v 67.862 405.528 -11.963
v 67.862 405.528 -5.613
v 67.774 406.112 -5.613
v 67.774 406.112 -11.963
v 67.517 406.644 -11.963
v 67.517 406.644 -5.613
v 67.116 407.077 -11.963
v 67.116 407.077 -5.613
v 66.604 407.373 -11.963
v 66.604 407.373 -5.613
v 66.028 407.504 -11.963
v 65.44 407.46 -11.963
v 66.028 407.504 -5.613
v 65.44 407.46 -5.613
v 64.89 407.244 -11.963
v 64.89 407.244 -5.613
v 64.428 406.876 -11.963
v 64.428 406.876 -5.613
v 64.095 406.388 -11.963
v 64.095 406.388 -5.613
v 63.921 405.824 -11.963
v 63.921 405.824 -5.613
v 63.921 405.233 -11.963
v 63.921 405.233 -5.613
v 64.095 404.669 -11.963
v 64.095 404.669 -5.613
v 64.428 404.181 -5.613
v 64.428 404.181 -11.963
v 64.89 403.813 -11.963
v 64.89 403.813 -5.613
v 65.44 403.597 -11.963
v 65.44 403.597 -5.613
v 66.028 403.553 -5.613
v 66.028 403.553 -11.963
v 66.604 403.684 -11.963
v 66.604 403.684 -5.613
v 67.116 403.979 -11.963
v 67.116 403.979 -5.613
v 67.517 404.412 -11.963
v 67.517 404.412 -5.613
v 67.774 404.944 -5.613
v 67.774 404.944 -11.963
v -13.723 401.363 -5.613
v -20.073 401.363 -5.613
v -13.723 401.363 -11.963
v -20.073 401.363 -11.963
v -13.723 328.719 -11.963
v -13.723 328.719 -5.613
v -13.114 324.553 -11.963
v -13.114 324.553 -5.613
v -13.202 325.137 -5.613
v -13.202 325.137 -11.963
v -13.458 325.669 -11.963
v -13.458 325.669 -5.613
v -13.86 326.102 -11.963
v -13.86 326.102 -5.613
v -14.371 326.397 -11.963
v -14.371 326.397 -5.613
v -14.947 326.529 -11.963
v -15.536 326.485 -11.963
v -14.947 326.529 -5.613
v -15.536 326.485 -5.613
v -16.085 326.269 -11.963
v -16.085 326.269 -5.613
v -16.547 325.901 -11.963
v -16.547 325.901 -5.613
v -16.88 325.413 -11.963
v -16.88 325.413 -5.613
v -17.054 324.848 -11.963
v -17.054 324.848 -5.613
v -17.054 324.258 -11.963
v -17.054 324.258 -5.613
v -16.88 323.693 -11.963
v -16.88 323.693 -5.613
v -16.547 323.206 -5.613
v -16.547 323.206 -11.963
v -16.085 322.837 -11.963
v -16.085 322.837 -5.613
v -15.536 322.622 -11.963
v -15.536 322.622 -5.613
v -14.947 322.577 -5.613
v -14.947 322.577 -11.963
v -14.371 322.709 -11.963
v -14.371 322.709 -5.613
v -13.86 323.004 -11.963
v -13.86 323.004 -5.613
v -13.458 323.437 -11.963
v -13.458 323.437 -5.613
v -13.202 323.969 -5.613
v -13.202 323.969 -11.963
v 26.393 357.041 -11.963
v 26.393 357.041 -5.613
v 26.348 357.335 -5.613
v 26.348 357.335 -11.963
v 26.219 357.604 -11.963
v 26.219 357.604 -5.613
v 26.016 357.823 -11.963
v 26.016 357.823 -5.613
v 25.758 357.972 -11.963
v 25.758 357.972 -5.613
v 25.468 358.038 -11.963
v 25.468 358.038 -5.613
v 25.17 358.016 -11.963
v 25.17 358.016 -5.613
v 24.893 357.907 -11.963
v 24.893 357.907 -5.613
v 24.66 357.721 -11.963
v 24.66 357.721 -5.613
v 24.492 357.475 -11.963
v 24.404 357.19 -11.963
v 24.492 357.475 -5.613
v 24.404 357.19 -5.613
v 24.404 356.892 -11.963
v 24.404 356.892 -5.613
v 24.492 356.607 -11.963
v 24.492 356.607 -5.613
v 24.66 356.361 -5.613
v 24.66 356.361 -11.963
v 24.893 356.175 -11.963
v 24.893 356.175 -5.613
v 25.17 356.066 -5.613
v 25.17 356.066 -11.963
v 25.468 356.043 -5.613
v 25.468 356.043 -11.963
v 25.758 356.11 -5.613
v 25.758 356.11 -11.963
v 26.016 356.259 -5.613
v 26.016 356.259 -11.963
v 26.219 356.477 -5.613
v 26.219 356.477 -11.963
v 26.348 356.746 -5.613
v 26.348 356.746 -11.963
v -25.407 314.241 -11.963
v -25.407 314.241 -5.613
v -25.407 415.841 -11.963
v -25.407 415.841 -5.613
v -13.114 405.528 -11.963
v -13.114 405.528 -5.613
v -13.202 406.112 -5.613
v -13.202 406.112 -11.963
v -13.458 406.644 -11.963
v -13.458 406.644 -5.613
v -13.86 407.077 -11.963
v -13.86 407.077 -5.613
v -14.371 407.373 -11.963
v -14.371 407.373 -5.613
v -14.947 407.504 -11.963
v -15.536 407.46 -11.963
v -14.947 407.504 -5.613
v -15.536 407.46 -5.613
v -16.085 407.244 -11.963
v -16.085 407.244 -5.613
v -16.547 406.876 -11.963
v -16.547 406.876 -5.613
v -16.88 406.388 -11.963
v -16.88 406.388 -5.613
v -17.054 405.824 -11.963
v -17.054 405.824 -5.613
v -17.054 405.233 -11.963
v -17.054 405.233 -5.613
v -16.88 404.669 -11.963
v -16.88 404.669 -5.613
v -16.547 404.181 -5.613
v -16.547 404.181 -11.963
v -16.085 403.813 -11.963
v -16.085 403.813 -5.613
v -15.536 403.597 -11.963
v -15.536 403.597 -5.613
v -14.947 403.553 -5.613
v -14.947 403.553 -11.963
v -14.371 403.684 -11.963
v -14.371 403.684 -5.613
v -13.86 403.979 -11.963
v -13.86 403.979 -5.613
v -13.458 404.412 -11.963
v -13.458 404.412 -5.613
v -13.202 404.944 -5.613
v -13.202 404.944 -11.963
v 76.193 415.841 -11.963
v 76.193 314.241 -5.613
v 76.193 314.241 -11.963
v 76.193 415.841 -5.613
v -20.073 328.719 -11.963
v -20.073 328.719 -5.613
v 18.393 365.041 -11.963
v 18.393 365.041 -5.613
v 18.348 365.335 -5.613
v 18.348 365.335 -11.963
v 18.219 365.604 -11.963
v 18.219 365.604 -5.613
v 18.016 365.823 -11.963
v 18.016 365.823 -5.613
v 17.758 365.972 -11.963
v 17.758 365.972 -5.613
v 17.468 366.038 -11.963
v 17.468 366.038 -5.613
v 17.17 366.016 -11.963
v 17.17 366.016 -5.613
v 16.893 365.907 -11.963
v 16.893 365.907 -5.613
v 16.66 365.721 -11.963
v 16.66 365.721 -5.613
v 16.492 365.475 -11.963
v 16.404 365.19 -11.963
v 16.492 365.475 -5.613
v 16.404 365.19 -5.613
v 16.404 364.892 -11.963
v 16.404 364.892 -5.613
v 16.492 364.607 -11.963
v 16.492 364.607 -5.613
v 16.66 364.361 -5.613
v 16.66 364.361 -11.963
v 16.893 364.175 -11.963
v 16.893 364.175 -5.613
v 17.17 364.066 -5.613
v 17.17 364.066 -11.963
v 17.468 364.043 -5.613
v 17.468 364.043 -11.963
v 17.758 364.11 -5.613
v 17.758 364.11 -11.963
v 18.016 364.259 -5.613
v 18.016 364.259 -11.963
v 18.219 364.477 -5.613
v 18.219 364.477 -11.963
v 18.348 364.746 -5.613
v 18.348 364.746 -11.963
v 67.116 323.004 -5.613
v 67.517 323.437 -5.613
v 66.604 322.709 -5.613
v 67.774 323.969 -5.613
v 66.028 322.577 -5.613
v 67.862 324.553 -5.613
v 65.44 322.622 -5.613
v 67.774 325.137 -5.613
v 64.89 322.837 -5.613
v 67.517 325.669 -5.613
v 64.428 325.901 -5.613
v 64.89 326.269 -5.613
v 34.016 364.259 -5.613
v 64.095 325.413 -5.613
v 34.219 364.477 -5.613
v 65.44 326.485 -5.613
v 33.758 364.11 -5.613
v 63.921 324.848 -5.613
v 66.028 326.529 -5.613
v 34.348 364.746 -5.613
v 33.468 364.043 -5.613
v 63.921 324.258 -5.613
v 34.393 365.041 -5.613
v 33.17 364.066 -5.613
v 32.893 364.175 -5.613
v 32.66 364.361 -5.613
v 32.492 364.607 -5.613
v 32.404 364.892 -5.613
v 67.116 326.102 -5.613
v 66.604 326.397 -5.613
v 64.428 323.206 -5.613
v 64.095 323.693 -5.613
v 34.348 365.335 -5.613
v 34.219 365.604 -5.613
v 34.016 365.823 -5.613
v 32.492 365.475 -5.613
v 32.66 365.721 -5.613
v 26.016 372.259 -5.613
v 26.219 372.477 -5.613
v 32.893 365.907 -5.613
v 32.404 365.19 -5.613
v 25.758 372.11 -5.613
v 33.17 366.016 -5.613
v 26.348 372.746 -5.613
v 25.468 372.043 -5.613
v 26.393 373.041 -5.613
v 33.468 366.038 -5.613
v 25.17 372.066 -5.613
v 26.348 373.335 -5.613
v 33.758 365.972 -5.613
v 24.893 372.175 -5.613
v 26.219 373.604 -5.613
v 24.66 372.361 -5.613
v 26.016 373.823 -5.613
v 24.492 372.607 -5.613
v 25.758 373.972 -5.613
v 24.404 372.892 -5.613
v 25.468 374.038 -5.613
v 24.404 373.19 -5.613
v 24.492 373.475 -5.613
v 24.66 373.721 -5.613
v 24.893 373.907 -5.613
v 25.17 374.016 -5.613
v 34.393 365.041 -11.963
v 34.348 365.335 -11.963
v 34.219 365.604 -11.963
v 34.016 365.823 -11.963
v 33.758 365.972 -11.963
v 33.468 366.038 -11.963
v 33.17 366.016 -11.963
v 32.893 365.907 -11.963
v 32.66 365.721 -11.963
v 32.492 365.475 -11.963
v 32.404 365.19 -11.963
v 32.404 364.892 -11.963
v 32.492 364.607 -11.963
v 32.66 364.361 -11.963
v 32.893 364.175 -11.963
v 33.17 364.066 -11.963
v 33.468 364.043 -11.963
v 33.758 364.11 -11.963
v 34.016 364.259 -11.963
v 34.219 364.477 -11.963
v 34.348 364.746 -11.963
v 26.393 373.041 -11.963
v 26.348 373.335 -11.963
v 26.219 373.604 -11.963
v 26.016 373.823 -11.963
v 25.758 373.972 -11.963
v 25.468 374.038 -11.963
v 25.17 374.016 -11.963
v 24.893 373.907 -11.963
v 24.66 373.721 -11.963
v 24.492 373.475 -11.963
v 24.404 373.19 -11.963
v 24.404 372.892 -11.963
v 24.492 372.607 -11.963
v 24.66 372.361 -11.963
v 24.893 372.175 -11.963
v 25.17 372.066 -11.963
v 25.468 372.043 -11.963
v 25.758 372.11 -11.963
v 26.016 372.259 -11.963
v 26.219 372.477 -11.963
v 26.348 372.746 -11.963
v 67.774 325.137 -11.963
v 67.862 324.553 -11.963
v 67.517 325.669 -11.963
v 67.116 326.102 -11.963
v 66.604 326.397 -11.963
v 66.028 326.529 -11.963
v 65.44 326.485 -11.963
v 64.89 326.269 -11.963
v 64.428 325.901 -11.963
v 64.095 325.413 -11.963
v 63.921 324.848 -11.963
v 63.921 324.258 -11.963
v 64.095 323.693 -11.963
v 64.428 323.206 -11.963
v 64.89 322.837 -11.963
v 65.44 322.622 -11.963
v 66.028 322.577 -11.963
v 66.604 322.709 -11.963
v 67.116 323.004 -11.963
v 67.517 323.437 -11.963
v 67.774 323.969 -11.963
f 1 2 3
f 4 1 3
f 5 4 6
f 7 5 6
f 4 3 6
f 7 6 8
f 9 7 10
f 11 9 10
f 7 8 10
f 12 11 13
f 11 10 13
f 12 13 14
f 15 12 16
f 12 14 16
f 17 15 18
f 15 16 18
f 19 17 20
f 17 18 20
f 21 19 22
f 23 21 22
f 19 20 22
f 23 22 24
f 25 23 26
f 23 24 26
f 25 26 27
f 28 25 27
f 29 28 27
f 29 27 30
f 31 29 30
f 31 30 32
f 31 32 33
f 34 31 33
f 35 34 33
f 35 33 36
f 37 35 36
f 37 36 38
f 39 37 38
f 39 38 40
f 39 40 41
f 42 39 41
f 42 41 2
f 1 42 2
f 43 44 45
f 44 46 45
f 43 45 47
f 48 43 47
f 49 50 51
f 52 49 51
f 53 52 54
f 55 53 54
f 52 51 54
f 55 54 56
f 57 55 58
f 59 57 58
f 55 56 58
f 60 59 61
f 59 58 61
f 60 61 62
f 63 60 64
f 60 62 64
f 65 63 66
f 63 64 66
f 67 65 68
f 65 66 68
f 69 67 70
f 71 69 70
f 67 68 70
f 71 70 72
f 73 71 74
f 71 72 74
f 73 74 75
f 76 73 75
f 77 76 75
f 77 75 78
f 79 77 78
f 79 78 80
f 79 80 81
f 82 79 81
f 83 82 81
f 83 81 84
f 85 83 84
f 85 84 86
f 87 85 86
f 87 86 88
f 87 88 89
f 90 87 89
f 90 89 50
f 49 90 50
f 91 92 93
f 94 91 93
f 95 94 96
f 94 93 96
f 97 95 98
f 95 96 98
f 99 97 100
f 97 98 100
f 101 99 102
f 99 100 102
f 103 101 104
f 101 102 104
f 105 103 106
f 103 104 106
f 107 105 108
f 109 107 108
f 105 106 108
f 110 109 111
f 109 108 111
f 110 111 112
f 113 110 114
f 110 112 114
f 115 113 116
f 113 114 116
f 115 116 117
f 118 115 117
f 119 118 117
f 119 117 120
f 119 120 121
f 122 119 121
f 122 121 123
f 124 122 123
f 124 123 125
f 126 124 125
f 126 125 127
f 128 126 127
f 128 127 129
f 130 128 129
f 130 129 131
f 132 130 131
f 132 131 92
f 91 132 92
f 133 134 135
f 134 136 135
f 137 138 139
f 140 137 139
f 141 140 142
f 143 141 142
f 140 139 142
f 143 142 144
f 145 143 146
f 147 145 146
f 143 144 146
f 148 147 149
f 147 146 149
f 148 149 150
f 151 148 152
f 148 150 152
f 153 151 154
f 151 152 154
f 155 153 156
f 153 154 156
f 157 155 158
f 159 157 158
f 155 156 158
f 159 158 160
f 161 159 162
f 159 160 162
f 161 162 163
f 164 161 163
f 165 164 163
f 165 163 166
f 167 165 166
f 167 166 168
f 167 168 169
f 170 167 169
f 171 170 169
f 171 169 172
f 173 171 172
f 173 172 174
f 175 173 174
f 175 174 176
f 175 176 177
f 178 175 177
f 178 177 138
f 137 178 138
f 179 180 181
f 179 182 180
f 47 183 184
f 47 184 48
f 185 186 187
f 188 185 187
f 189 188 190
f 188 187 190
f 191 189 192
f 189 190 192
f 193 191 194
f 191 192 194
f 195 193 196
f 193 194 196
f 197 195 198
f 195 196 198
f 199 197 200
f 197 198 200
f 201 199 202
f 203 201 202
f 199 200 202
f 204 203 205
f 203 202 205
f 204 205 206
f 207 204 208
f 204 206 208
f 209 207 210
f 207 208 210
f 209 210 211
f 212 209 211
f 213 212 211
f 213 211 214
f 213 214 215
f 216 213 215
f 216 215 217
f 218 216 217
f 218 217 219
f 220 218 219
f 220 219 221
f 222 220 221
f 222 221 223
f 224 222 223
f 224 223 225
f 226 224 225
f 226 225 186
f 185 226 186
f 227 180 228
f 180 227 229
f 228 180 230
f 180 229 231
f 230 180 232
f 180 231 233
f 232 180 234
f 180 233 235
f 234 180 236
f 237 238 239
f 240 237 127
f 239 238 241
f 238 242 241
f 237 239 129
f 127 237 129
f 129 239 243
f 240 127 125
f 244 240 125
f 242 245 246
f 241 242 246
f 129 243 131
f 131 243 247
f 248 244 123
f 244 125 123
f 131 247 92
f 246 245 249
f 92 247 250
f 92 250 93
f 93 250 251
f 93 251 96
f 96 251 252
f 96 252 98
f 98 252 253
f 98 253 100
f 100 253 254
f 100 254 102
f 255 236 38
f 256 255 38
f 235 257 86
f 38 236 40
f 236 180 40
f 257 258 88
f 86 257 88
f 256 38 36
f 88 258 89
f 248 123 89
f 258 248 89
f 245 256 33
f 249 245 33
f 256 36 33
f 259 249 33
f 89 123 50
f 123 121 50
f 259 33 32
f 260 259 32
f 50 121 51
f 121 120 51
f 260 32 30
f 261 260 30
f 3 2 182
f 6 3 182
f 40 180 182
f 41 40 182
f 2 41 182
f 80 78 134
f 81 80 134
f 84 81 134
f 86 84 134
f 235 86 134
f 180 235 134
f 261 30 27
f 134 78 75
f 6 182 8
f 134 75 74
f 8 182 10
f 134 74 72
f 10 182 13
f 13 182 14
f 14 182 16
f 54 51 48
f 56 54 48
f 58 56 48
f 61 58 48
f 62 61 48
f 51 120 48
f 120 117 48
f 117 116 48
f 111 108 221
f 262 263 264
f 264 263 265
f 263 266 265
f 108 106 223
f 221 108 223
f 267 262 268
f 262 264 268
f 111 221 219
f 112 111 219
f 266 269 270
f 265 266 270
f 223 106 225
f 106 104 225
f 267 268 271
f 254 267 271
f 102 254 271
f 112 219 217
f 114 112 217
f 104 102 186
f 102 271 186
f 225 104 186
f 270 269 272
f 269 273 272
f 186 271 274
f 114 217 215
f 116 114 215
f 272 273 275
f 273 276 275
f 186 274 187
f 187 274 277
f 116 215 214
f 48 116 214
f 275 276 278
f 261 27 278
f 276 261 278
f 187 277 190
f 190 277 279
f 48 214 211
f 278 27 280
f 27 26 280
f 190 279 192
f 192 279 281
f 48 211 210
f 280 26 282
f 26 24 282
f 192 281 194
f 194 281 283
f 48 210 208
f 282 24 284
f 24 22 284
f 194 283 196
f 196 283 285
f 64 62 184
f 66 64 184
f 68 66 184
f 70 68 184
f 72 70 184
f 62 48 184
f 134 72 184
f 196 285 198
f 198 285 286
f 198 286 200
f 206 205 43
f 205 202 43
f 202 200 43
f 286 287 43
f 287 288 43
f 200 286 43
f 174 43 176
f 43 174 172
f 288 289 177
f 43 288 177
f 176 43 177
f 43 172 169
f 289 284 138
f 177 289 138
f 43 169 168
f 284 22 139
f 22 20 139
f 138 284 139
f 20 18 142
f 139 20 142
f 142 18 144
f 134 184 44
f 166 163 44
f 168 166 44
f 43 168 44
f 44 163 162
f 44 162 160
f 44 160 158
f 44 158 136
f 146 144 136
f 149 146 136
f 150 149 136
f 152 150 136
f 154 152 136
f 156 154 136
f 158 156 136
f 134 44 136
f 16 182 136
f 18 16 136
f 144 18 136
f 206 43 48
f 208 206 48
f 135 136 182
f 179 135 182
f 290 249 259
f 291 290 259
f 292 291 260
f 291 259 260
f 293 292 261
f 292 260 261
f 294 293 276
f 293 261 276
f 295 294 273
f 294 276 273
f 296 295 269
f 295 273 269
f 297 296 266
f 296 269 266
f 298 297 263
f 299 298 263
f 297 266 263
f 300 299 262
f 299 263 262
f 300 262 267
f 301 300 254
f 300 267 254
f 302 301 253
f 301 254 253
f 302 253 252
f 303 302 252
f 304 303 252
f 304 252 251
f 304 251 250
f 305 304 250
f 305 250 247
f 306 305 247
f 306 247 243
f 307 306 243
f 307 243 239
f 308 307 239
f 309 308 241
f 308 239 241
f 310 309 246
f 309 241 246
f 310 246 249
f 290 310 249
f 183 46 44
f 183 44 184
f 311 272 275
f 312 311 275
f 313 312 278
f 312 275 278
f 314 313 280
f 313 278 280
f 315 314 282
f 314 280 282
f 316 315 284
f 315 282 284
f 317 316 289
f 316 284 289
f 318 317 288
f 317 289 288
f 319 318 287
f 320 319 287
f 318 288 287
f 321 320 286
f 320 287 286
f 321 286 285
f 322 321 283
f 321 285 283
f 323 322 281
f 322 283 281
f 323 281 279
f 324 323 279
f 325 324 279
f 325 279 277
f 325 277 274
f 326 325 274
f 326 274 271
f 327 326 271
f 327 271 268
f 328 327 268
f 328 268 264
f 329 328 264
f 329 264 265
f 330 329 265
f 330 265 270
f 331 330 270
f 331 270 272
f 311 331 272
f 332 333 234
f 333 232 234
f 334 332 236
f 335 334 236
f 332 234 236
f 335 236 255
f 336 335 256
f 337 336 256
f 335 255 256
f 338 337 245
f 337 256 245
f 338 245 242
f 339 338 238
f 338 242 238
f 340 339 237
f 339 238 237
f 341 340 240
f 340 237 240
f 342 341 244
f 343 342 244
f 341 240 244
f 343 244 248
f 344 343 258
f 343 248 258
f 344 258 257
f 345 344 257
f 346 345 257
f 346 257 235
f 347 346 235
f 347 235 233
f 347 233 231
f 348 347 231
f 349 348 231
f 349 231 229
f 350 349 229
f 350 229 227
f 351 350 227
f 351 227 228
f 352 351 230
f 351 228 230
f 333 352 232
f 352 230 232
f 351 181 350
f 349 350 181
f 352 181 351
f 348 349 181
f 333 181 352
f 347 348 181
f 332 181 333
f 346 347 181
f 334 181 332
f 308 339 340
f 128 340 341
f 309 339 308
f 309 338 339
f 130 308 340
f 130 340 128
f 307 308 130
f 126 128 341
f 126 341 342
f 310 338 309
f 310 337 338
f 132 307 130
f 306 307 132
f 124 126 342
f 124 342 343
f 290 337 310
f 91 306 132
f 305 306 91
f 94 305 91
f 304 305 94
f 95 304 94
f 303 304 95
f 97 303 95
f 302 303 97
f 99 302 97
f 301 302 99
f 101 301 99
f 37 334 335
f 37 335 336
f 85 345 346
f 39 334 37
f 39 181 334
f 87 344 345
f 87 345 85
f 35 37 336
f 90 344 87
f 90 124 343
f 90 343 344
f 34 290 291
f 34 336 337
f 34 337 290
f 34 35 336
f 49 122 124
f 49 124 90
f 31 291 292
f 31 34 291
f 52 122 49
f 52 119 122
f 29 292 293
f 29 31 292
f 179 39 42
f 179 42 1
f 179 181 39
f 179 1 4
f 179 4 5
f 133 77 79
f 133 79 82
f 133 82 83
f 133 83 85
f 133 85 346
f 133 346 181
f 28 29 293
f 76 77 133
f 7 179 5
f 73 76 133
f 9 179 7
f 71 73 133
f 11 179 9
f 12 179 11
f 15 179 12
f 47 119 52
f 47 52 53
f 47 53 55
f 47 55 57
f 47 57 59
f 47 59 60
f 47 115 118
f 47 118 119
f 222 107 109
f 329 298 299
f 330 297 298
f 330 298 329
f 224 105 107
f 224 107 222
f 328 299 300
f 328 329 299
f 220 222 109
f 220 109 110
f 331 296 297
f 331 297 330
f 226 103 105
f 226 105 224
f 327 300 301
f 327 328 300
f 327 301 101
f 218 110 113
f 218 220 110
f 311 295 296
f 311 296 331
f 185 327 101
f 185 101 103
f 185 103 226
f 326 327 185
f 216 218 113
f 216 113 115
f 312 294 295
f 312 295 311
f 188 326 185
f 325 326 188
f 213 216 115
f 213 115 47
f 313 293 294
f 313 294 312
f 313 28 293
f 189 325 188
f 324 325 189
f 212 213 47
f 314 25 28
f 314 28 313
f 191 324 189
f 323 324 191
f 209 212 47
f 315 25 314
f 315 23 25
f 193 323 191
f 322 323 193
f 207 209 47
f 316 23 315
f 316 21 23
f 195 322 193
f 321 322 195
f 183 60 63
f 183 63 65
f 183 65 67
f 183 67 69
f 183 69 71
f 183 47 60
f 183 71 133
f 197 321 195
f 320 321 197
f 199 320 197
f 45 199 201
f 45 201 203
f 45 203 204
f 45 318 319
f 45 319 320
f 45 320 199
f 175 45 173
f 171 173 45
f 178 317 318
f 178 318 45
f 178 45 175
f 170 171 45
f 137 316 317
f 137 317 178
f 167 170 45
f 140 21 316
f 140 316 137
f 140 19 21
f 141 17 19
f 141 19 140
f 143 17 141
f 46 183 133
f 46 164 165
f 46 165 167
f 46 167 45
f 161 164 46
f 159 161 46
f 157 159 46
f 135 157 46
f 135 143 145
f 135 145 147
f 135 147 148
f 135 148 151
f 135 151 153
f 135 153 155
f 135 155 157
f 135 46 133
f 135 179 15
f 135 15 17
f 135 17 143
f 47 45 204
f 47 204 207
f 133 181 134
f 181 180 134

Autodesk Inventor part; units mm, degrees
ref_plane "YZ Plane" through (0, 0, 0) normal (1, 0, 0) x (0, 1, 0)
ref_plane "XZ Plane" through (0, 0, 0) normal (0, 1, 0) x (-1, 0, 0)
ref_plane "XY Plane" through (0, 0, 0) normal (0, 0, 1) x (1, 0, 0)
sketch "Sketch1" plane through (0, 0, 0) normal (0, 0, 1) x (1, 0, 0)
  line L0 (-25.4072, 25.3665) -> (76.1928, 25.3665)
  line L1 (76.1928, 25.3665) -> (76.1928, -76.2335)
  line L2 (76.1928, -76.2335) -> (-25.4072, -76.2335)
  line L3 (-25.4072, -76.2335) -> (-25.4072, 25.3665)
  point P0 (0, 0)
  dimension "d0" = 101.6
  dimension "d1" = 101.6
extrude "Extrusion1" add sketch "Sketch1" along normal blind 0.7366
sketch "Sketch2" plane through (0, 0, 0.7366) normal (0, 0, 1) x (1, 0, 0)
  line L0 (-25.4072, 25.3665) -> (76.1928, -76.2335)
  line L1 (76.1928, 25.3665) -> (-25.4072, -76.2335)
  circle A0 centre (25.3928, -25.4335) radius 27.432
  point P0 (0, 0)
  dimension "d4" = 54.864
extrude "Extrusion2" cut sketch "Sketch2" against normal blind 0.7366
sketch "Sketch3" plane through (0, 0, 0.7366) normal (0, 0, 1) x (1, 0, 0)
  line L0 (-25.4072, -76.2335) -> (-25.4072, 25.3665) projected
  line L1 (-25.4072, 25.3665) -> (-25.4072, -25.4335)
  line L2 (-25.4072, -25.4335) -> (-25.4072, 19.4102)
  line L3 (-25.4072, 25.3665) -> (76.1928, -76.2335)
  line L4 (76.1928, 25.3665) -> (-25.4072, -76.2335)
  circle A0 centre (-19.4509, 19.4102) radius 1.9812
  point P0 (0, 0)
  dimension "d7" = 44.8437
  dimension "d8" = 3.9624
extrude "Extrusion3" cut sketch "Sketch3" against normal blind 0.7366 contours A0 L3 | L3 A0
sketch "Sketch4" plane through (0, 0, 0.7366) normal (0, 0, 1) x (1, 0, 0)
  line L0 (-25.4072, -76.2335) -> (76.1928, 25.3665)
  line L1 (-25.4072, 25.3665) -> (76.1928, -76.2335)
  circle A0 centre (70.2365, 19.4102) radius 1.9819
  circle A1 centre (70.2365, -70.2772) radius 1.983
  circle A2 centre (-19.4509, -70.2772) radius 1.9812
  point P0 (0, 0)
extrude "Extrusion4" cut sketch "Sketch4" against normal blind 0.7366
sketch "Sketch5" plane through (0, 0, 0.7366) normal (0, 0, 1) x (1, 0, 0)
  circle A0 centre (25.3928, -25.4335) radius 27.432 projected
  circle A1 centre (25.3928, -25.4335) radius 29.972
  circle A2 centre (25.3928, -25.4335) radius 32.512
  point P0 (0, 0)
  dimension "d13" = 59.944
  dimension "d14" = 65.024
extrude "Extrusion5" add sketch "Sketch5" along normal blind 6.6548 contours A2
fillet "Fillet1" radius 3.175 4 edges at (-25.4072, 25.3665, 0.3683) (76.1928, 25.3665, 0.3683) (76.1928, -76.2335, 0.3683) (-25.4072, -76.2335, 0.3683)
sketch "Sketch6" plane through (25.3928, -25.4335, 0.7366) normal (0, 0, 1) x (1, 0, 0)
  circle A0 centre (0, 0) radius 29.972 projected
  circle A1 centre (0, 0) radius 27.432 projected
  point P0 (-25.3928, 25.4335)
extrude "Extrusion6" add sketch "Sketch6" along normal blind 9.1948
sketch "Sketch7" plane through (25.3928, -25.4335, 7.3914) normal (0, 0, 1) x (1, 0, 0)
  circle A0 centre (0, 0) radius 29.972 projected
  circle A1 centre (0, 0) radius 32.512 projected
  point P0 (-25.3928, 25.4335)
extrude "Extrusion7" cut sketch "Sketch7" against normal blind 6.6548
sketch "Sketch8" plane through (25.3928, -25.4335, 9.9314) normal (0, 0, 1) x (1, 0, 0)
  circle A0 centre (0, 0) radius 27.432 projected
  circle A1 centre (0, 0) radius 29.972 projected
  point P0 (-25.3928, 25.4335)
extrude "Extrusion8" cut sketch "Sketch8" against normal blind 2.54
sketch "Sketch9" plane through (0, 0, 0.7366) normal (0, 0, 1) x (1, 0, 0)
  circle A0 centre (-19.4509, 19.4102) radius 1.9812 projected
  circle A1 centre (70.2365, -70.2772) radius 1.983 projected
  circle A2 centre (-19.4509, -70.2772) radius 1.9812 projected
  circle A3 centre (70.2365, 19.4102) radius 1.9819 projected
  point P0 (0, 0)
extrude "Extrusion9" add sketch "Sketch9" against normal blind 0.7366
sketch "Sketch10" plane through (0, 0, 0.7366) normal (0, 0, 1) x (1, 0, 0)
  line L0 (-25.4072, 25.3665) -> (76.1928, 25.3665)
  line L1 (76.1928, 25.3665) -> (76.1928, -76.2335)
  line L2 (76.1928, -76.2335) -> (-25.4072, -76.2335)
  line L3 (-25.4072, -76.2335) -> (-25.4072, 25.3665)
  line L4 (-25.4072, 25.3665) -> (76.1928, -76.2335)
  line L5 (-25.4072, -76.2335) -> (76.1928, 25.3665)
  line L6 (-25.4072, 25.3665) -> (-25.4072, -25.4335)
  line L7 (-25.4072, -25.4335) -> (-25.4072, 15.0541)
  circle A0 centre (-15.0948, 15.0541) radius 1.9812
  circle A1 centre (65.8804, 15.0541) radius 1.9818
  circle A2 centre (65.8804, -65.9211) radius 1.9832
  circle A3 centre (-15.0948, -65.9211) radius 1.9812
  point P0 (0, 0)
  dimension "d26" = 40.4876
  dimension "d27" = 3.9624
extrude "Extrusion10" cut sketch "Sketch10" against normal blind 0.7366 contours A0 L4 | L4 A0 | A1 L5 | L5 A1 | A2 L4 | L4 A2 | A3 L5 | L5 A3
sketch "Sketch11" plane through (0, 0, 0.7366) normal (0, 0, 1) x (1, 0, 0)
  circle A0 centre (-15.0948, 15.0541) radius 1.9812 projected
  circle A1 centre (-15.0948, -65.9211) radius 1.9812 projected
  circle A2 centre (65.8804, 15.0541) radius 1.9818 projected
  circle A3 centre (65.8804, -65.9211) radius 1.9832 projected
  line L0 (-25.4072, 25.3665) -> (76.1928, 25.3665)
  line L1 (76.1928, 25.3665) -> (76.1928, -76.2335)
  line L2 (76.1928, -76.2335) -> (-25.4072, -76.2335)
  line L3 (-25.4072, -76.2335) -> (-25.4072, 25.3665)
  point P0 (0, 0)
extrude "Extrusion11" add sketch "Sketch11" along normal blind 12.7
sketch "Sketch12" plane through (0, 0, 13.4366) normal (0, 0, 1) x (1, 0, 0)
  circle A0 centre (65.8804, -65.9211) radius 1.9832 projected
  circle A1 centre (65.8804, 15.0541) radius 1.9818 projected
  circle A2 centre (-15.0948, 15.0541) radius 1.9812 projected
  circle A3 centre (-15.0948, -65.9211) radius 1.9812 projected
  line L0 (76.1928, 25.3665) -> (76.1928, -76.2335) projected
  line L1 (-25.4072, 25.3665) -> (76.1928, 25.3665) projected
  line L2 (-25.4072, -76.2335) -> (-25.4072, 25.3665) projected
  line L3 (76.1928, -76.2335) -> (-25.4072, -76.2335) projected
  point P0 (0, 0)
extrude "Extrusion12" add sketch "Sketch12" against normal blind 19.05
sketch "Sketch13" plane through (0, 0, 13.4366) normal (0, 0, 1) x (1, 0, 0)
  circle A0 centre (65.8804, -65.9211) radius 1.9832 projected
  circle A1 centre (65.8804, 15.0541) radius 1.9818 projected
  circle A2 centre (-15.0948, 15.0541) radius 1.9812 projected
  circle A3 centre (-15.0948, -65.9211) radius 1.9812 projected
  line L0 (76.1928, 25.3665) -> (76.1928, -76.2335) projected
  line L1 (-25.4072, 25.3665) -> (76.1928, 25.3665) projected
  line L2 (-25.4072, -76.2335) -> (-25.4072, 25.3665) projected
  line L3 (76.1928, -76.2335) -> (-25.4072, -76.2335) projected
  point P0 (0, 0)
extrude "Extrusion13" cut sketch "Sketch13" against normal blind 12.7
sketch "Sketch14" plane through (-25.4072, 25.3665, -5.6134) normal (0, 1, 0) x (1, 0, 0)
  line L0 (0, -6.35) -> (101.6, -6.35) projected
  line L1 (101.6, -6.35) -> (101.6, 0) projected
  line L2 (101.6, 0) -> (0, 0) projected
  line L3 (0, 0) -> (0, -6.35) projected
  point P0 (25.4072, -5.6134)
sketch "Sketch15" plane through (-25.4072, -76.2335, -5.6134) normal (-1, 0, 0) x (0, 0, 1)
  line L0 (6.35, 0) -> (6.35, 101.6) projected
  line L1 (0, 101.6) -> (6.35, 101.6) projected
  line L2 (0, 101.6) -> (0, 0) projected
  line L3 (6.35, 0) -> (0, 0) projected
  point P0 (5.6134, 76.2335)
sketch "Sketch16" plane through (-25.4072, -76.2335, -5.6134) normal (0, -1, 0) x (1, 0, 0)
  line L0 (101.6, 6.35) -> (0, 6.35) projected
  line L1 (0, 6.35) -> (0, 0) projected
  line L2 (0, 0) -> (101.6, 0) projected
  line L3 (101.6, 6.35) -> (101.6, 0) projected
  point P0 (25.4072, 5.6134)
sketch "Sketch17" plane through (76.1928, -76.2335, -5.6134) normal (1, 0, 0) x (0, 0, -1)
  line L0 (-6.35, 101.6) -> (-6.35, 0) projected
  line L1 (-6.35, 0) -> (0, 0) projected
  line L2 (0, 0) -> (0, 101.6) projected
  line L3 (-6.35, 101.6) -> (0, 101.6) projected
  point P0 (-5.6134, 76.2335)
extrude "Extrusion14" add sketch "Sketch14" along normal blind 53.975
extrude "Extrusion15" add sketch "Sketch17" along normal blind 47.625
extrude "Extrusion16" add sketch "Sketch16" along normal blind 47.625
extrude "Extrusion17" add sketch "Sketch15" along normal blind 53.975
sketch "Sketch18" plane through (-25.4072, 25.3665, 0.7366) normal (0, 1, 0) x (1, 0, 0)
  line L0 (-53.975, 6.35) -> (-53.975, 0) projected
  line L1 (0, 0) -> (-53.975, 0) projected
  line L2 (0, 6.35) -> (0, 0) projected
  line L3 (0, 6.35) -> (-53.975, 6.35) projected
  point P0 (25.4072, 0.7366)
extrude "Extrusion18" add sketch "Sketch18" along normal blind 53.975
sketch "Sketch19" plane through (76.1928, 25.3665, 0.7366) normal (0, 1, 0) x (1, 0, 0)
  line L0 (47.625, 0) -> (47.625, 6.35) projected
  line L1 (0, 6.35) -> (47.625, 6.35) projected
  line L2 (0, 0) -> (0, 6.35) projected
  line L3 (0, 0) -> (47.625, 0) projected
  point P0 (-76.1928, 0.7366)
extrude "Extrusion19" add sketch "Sketch19" along normal blind 53.975
sketch "Sketch20" plane through (-25.4072, -123.8585, -5.6134) normal (-1, 0, 0) x (0, 0, 1)
  line L0 (6.35, 47.625) -> (0, 47.625) projected
  line L1 (0, 47.625) -> (0, 0) projected
  line L2 (0, 0) -> (6.35, 0) projected
  line L3 (6.35, 0) -> (6.35, 47.625) projected
  point P0 (5.6134, 123.8585)
extrude "Extrusion20" add sketch "Sketch20" along normal blind 53.975
sketch "Sketch21" plane through (123.8178, -76.2335, -5.6134) normal (0, -1, 0) x (1, 0, 0)
  line L0 (-47.625, 6.35) -> (-47.625, 0) projected
  line L1 (-47.625, 0) -> (0, 0) projected
  line L2 (0, 0) -> (0, 6.35) projected
  line L3 (0, 6.35) -> (-47.625, 6.35) projected
  point P0 (-123.8178, 5.6134)
extrude "Extrusion21" add sketch "Sketch21" along normal blind 47.625
sketch "Sketch22" plane through (-25.4072, 79.3415, -5.6134) normal (0, 1, 0) x (1, 0, 0)
  line L0 (149.225, -6.35) -> (-53.975, -6.35) projected
  line L1 (149.225, 0) -> (149.225, -6.35) projected
  line L2 (-53.975, 0) -> (149.225, 0) projected
  line L3 (-53.975, -6.35) -> (-53.975, 0) projected
  point P0 (25.4072, -5.6134)
extrude "Extrusion22" cut sketch "Sketch22" against normal blind 53.975
sketch "Sketch23" plane through (-79.3822, -76.2335, -5.6134) normal (-1, 0, 0) x (0, 0, 1)
  line L0 (6.35, 101.6) -> (0, 101.6) projected
  line L1 (0, -47.625) -> (0, 101.6) projected
  line L2 (6.35, -47.625) -> (0, -47.625) projected
  line L3 (6.35, 101.6) -> (6.35, -47.625) projected
  point P0 (5.6134, 76.2335)
extrude "Extrusion23" cut sketch "Sketch23" against normal blind 53.975
sketch "Sketch24" plane through (-25.4072, -123.8585, -5.6134) normal (0, -1, 0) x (1, 0, 0)
  line L0 (0, 6.35) -> (0, 0) projected
  line L1 (149.225, 0) -> (0, 0) projected
  line L2 (149.225, 6.35) -> (149.225, 0) projected
  line L3 (0, 6.35) -> (149.225, 6.35) projected
  point P0 (25.4072, 5.6134)
extrude "Extrusion24" cut sketch "Sketch24" against normal blind 47.625
sketch "Sketch25" plane through (123.8178, -76.2335, -5.6134) normal (1, 0, 0) x (0, 0, -1)
  line L0 (-6.35, 0) -> (0, 0) projected
  line L1 (0, 101.6) -> (0, 0) projected
  line L2 (0, 101.6) -> (-6.35, 101.6) projected
  line L3 (-6.35, 0) -> (-6.35, 101.6) projected
  point P0 (-5.6134, 76.2335)
extrude "Extrusion25" cut sketch "Sketch25" against normal blind 47.625
sketch "Sketch26" plane through (-25.4072, 25.3665, -5.6134) normal (0, 1, 0) x (1, 0, 0)
  line L0 (101.6, -6.35) -> (101.6, 0) projected
  line L1 (0, 0) -> (101.6, 0) projected
  line L2 (0, 0) -> (0, -6.35) projected
  line L3 (101.6, -6.35) -> (0, -6.35) projected
  point P0 (25.4072, -5.6134)
extrude "Extrusion26" add sketch "Sketch26" along normal blind 53.975
sketch "Sketch27" plane through (-25.4072, -76.2335, -5.6134) normal (-1, 0, 0) x (0, 0, 1)
  line L0 (0, 0) -> (6.35, 0) projected
  line L1 (6.35, 0) -> (6.35, 155.575) projected
  line L2 (6.35, 155.575) -> (0, 155.575) projected
  line L3 (0, 0) -> (0, 155.575) projected
  point P0 (5.6134, 76.2335)
extrude "Extrusion27" add sketch "Sketch27" along normal blind 53.975
sketch "Sketch28" plane through (-25.4072, -76.2335, -5.6134) normal (0, -1, 0) x (1, 0, 0)
  line L0 (101.6, 0) -> (101.6, 6.35) projected
  line L1 (101.6, 6.35) -> (-53.975, 6.35) projected
  line L2 (-53.975, 6.35) -> (-53.975, 0) projected
  line L3 (101.6, 0) -> (-53.975, 0) projected
  point P0 (25.4072, 5.6134)
extrude "Extrusion28" add sketch "Sketch28" along normal blind 22.225
sketch "Sketch29" plane through (-25.4072, 79.3415, -5.6134) normal (0, 1, 0) x (1, 0, 0)
  line L0 (101.6, -6.35) -> (-53.975, -6.35) projected
  line L1 (101.6, 0) -> (101.6, -6.35) projected
  line L2 (-53.975, 0) -> (101.6, 0) projected
  line L3 (-53.975, 0) -> (-53.975, -6.35) projected
  point P0 (25.4072, -5.6134)
extrude "Extrusion29" add sketch "Sketch29" along normal blind 158.6992
sketch "Sketch30" plane through (-25.4072, 238.0407, -5.6134) normal (0, 1, 0) x (1, 0, 0)
  line L0 (-53.975, -6.35) -> (-53.975, 0) projected
  line L1 (101.6, -6.35) -> (-53.975, -6.35) projected
  line L2 (101.6, 0) -> (101.6, -6.35) projected
  line L3 (-53.975, 0) -> (101.6, 0) projected
  point P0 (25.4072, -5.6134)
extrude "Extrusion30" add sketch "Sketch30" along normal blind 177.8
sketch "Sketch31" plane through (0, 0, 0.7366) normal (0, 0, 1) x (1, 0, 0)
  line L0 (76.1928, 415.8407) -> (76.1928, -98.4585) projected
  line L1 (76.1928, 415.8407) -> (-79.3822, 415.8407) projected
  line L2 (65.8804, 415.8407) -> (65.8804, 383.3033)
  line L3 (65.8804, 383.3033) -> (-17.076, 383.3033)
  line L4 (-17.076, 383.3033) -> (-13.1136, 383.3033)
  line L5 (-13.1136, 383.3033) -> (-15.0948, 383.3033)
  circle A0 centre (-15.0948, 383.3033) radius 1.9812
  circle A1 centre (65.8804, 383.3033) radius 1.9812
  line L6 (65.8804, 383.3033) -> (65.8804, 302.3281)
  circle A2 centre (65.8804, 302.3281) radius 1.9812
  line L7 (-15.0948, 383.3033) -> (-15.0948, 302.3281)
  circle A3 centre (-15.0948, 302.3281) radius 1.9812
  point P0 (0, 0)
  dimension "d70" = 32.5374
  dimension "d71" = 80.9752
extrude "Extrusion31" cut sketch "Sketch31" against normal blind 177.8
sketch "Sketch32" plane through (0, 0, -5.6134) normal (0, 0, -1) x (-1, 0, 0)
  circle A0 centre (15.0948, 383.3033) radius 1.9812 projected
  circle A1 centre (15.0948, 302.3281) radius 1.9812 projected
  circle A2 centre (-65.8804, 302.3281) radius 1.9812 projected
  circle A3 centre (-65.8804, 383.3033) radius 1.9812 projected
  circle A4 centre (15.0948, -65.9211) radius 1.9812 projected
  circle A5 centre (15.0948, 15.0541) radius 1.9812 projected
  circle A6 centre (-65.8804, 15.0541) radius 1.9818 projected
  circle A7 centre (-65.8804, -65.9211) radius 1.9832 projected
  line L0 (-76.1928, 415.8407) -> (-76.1928, -98.4585) projected
  line L1 (-76.1928, -98.4585) -> (79.3822, -98.4585) projected
  line L2 (79.3822, -98.4585) -> (79.3822, 415.8407) projected
  line L3 (79.3822, 415.8407) -> (-76.1928, 415.8407) projected
  point P0 (0, 0)
extrude "Extrusion32" add sketch "Sketch32" along normal blind 6.35
sketch "Sketch33" plane through (0, 0, 0.7366) normal (0, 0, 1) x (1, 0, 0)
  line L0 (76.1928, 415.8407) -> (76.1928, -98.4585) projected
  line L1 (76.1928, 158.6911) -> (76.1928, 107.8911)
  line L2 (76.1928, 107.8911) -> (25.3928, 107.8911)
  line L3 (25.3928, 107.8911) -> (25.3928, 209.4911)
  line L4 (25.3928, 209.4911) -> (76.1928, 209.4911)
  line L5 (76.1928, 209.4911) -> (76.1928, 107.8911)
  point P0 (0, 0)
  dimension "d76" = 50.8
  dimension "d77" = 50.8
  dimension "d78" = 101.6
extrude "Extrusion33" cut sketch "Sketch33" against normal blind 25.4
sketch "Sketch34" plane through (0, 0, 0.7366) normal (0, 0, 1) x (1, 0, 0)
  line L0 (25.3928, 107.8911) -> (25.3928, 209.4911) projected
  line L1 (76.1928, 107.8911) -> (76.1928, -98.4585) projected
  line L2 (25.3928, 158.6911) -> (-25.4072, 158.6911)
  circle A0 centre (-25.4072, 158.6911) radius 12.7
  point P0 (0, 0)
  dimension "d81" = 50.8
  dimension "d82" = 25.4
extrude "Extrusion34" cut sketch "Sketch34" against normal blind 25.4
fillet "Fillet2" radius 12.7 2 edges at (25.3928, 209.4911, -5.6134) (25.3928, 107.8911, -5.6134)
sketch "Sketch35" plane through (0, 0, 0.7366) normal (0, 0, 1) x (1, 0, 0)
  line L0 (-79.3822, 415.8407) -> (76.1928, 415.8407)
  line L1 (76.1928, 415.8407) -> (76.1928, 422.1907)
  line L2 (76.1928, 422.1907) -> (-79.3822, 422.1907)
  line L3 (-79.3822, 422.1907) -> (-79.3822, 415.8407)
  line L4 (-79.3822, -98.4585) -> (76.1928, -98.4585)
  line L5 (76.1928, -98.4585) -> (76.1928, -104.8085)
  line L6 (76.1928, -104.8085) -> (-79.3822, -104.8085)
  line L7 (-79.3822, -104.8085) -> (-79.3822, -98.4585)
  point P0 (0, 0)
  dimension "d86" = 6.35
  dimension "d87" = 6.35
extrude "Extrusion35" add sketch "Sketch35" against normal blind 6.35
sketch "Sketch36" plane through (-25.4072, 415.8407, -5.6134) normal (0, 1, 0) x (1, 0, 0)
  line L0 (-53.975, 0) -> (101.6, 0) projected
  line L1 (101.6, 6.35) -> (101.6, 0) projected
  line L2 (101.6, 6.35) -> (-53.975, 6.35) projected
  line L3 (-53.975, 0) -> (-53.975, 6.35) projected
  point P0 (25.4072, -5.6134)
extrude "Extrusion36" add sketch "Sketch36" along normal blind 6.35
sketch "Sketch37" plane through (-25.4072, -98.4585, -5.6134) normal (0, -1, 0) x (1, 0, 0)
  line L0 (101.6, 0) -> (-53.975, 0) projected
  line L1 (-53.975, -6.35) -> (-53.975, 0) projected
  line L2 (-53.975, -6.35) -> (101.6, -6.35) projected
  line L3 (101.6, 0) -> (101.6, -6.35) projected
  point P0 (25.4072, 5.6134)
extrude "Extrusion37" add sketch "Sketch37" along normal blind 6.35
sketch "Sketch38" plane through (0, 0, 0.7366) normal (0, 0, 1) x (1, 0, 0)
  line L0 (76.1928, 422.1907) -> (-79.3822, 422.1907) projected
  line L1 (76.1928, 107.8911) -> (76.1928, -104.8085) projected
  circle A0 centre (65.8804, 302.3281) radius 1.9812 projected
  circle A1 centre (-15.0948, 302.3281) radius 1.9812 projected
  line L2 (-15.0948, 422.1907) -> (-15.0948, 405.5283)
  line L3 (-15.0948, 405.5283) -> (65.8804, 405.5283)
  line L4 (65.8804, 302.3281) -> (65.8804, 324.5531)
  line L5 (-15.0948, 302.3281) -> (-15.0948, 324.5531)
  circle A2 centre (-15.0948, 324.5531) radius 1.9812
  circle A3 centre (-15.0948, 405.5283) radius 1.9812
  circle A4 centre (65.8804, 405.5283) radius 1.9812
  circle A5 centre (65.8804, 324.5531) radius 1.9812
  point P0 (0, 0)
  dimension "d94" = 16.6624
  dimension "d95" = 22.225
extrude "Extrusion38" cut sketch "Sketch38" against normal blind 12.7 contours A3 L3 L2 | L2 L3 A3 | A2 | A4 | A5
sketch "Sketch39" plane through (0, 0, 0.7366) normal (0, 0, 1) x (1, 0, 0)
  circle A0 centre (65.8804, 383.3033) radius 1.9812 projected
  circle A1 centre (65.8804, 302.3281) radius 1.9812 projected
  circle A2 centre (-15.0948, 302.3281) radius 1.9812 projected
  circle A3 centre (-15.0948, 383.3033) radius 1.9812 projected
  point P0 (0, 0)
extrude "Extrusion39" add sketch "Sketch39" against normal blind 12.7
sketch "Sketch40" plane through (0, 0, 0.7366) normal (0, 0, 1) x (1, 0, 0)
  circle A0 centre (-15.0948, 15.0541) radius 1.9812 projected
  circle A1 centre (-15.0948, -65.9211) radius 1.9812 projected
  line L0 (76.1928, 107.8911) -> (76.1928, -104.8085) projected
  line L1 (-15.0948, -65.9211) -> (-15.0948, -88.1461)
  line L2 (-15.0948, -88.1461) -> (65.8804, -88.1461)
  line L3 (-15.0948, 15.0541) -> (-15.0948, -7.1709)
  line L4 (-15.0948, -7.1709) -> (65.8804, -7.1709)
  circle A2 centre (-15.0948, -88.1461) radius 1.9812
  circle A3 centre (65.8804, -88.1461) radius 1.9818
  circle A4 centre (65.8804, -7.1709) radius 1.9818
  circle A5 centre (-15.0948, -7.1709) radius 1.9812
  point P0 (0, 0)
  dimension "d100" = 22.225
  dimension "d101" = 22.225
extrude "Extrusion40" cut sketch "Sketch40" against normal blind 12.7 contours A2 L2 L1 | L1 L2 A2 | A5 L4 L3 | L3 L4 A5 | A3 | A4
sketch "Sketch41" plane through (0, 0, 0.7366) normal (0, 0, 1) x (1, 0, 0)
  circle A0 centre (65.8804, -65.9211) radius 1.9832 projected
  circle A1 centre (65.8804, 15.0541) radius 1.9818 projected
  circle A2 centre (-15.0948, 15.0541) radius 1.9812 projected
  circle A3 centre (-15.0948, -65.9211) radius 1.9812 projected
  point P0 (0, 0)
extrude "Extrusion41" add sketch "Sketch41" against normal blind 12.7
sketch "Sketch42" plane through (0, 0, 0.7366) normal (0, 0, 1) x (1, 0, 0)
  circle A0 centre (65.8804, -7.1709) radius 1.9818 projected
  circle A1 centre (65.8804, -88.1461) radius 1.9818 projected
  circle A2 centre (-15.0948, -7.1709) radius 1.9812 projected
  circle A3 centre (-15.0948, -88.1461) radius 1.9812 projected
  circle A4 centre (-15.0948, 405.5283) radius 1.9812 projected
  circle A5 centre (-15.0948, 324.5531) radius 1.9812 projected
  circle A6 centre (65.8804, 405.5283) radius 1.9812 projected
  circle A7 centre (-25.4072, 158.6911) radius 12.7 projected
  line L0 (76.1928, 107.8911) -> (38.0928, 107.8911) projected
  arc A8 (25.3928, 120.5911) -> (38.0928, 107.8911) centre (38.0928, 120.5911) ccw projected
  line L1 (25.3928, 120.5911) -> (25.3928, 196.7911) projected
  arc A9 (38.0928, 209.4911) -> (25.3928, 196.7911) centre (38.0928, 196.7911) ccw projected
  line L2 (38.0928, 209.4911) -> (76.1928, 209.4911) projected
  line L3 (76.1928, 422.1907) -> (76.1928, 209.4911) projected
  line L4 (76.1928, 422.1907) -> (-79.3822, 422.1907) projected
  line L5 (-79.3822, 422.1907) -> (-79.3822, -104.8085) projected
  line L6 (-79.3822, -104.8085) -> (76.1928, -104.8085) projected
  line L7 (76.1928, 107.8911) -> (76.1928, -104.8085) projected
  line L8 (65.8804, 405.5283) -> (-15.0948, 405.5283)
  line L9 (-15.0948, 405.5283) -> (-15.0948, 324.5531)
  line L10 (25.3928, 365.0407) -> (25.3928, 415.8407)
  line L11 (25.3928, 415.8407) -> (-25.4072, 415.8407)
  line L12 (-25.4072, 415.8407) -> (76.1928, 415.8407)
  line L13 (76.1928, 415.8407) -> (76.1928, 314.2407)
  line L14 (76.1928, 314.2407) -> (-25.4072, 314.2407)
  line L15 (-25.4072, 314.2407) -> (-25.4072, 415.8407)
  point P0 (0, 0)
  dimension "d106" = 50.8
  dimension "d107" = 50.8
  dimension "d108" = 101.6
  dimension "d109" = 101.6
extrude "Extrusion42" cut sketch "Sketch42" against normal blind 25.4 contours L7 L6 L5 L4 L3 L12 L11 L15 L14 L2 A9 L1 A8 L0
sketch "Sketch43" plane through (0, 0, 0.7366) normal (0, 0, 1) x (1, 0, 0)
  line L0 (-25.4072, 314.2407) -> (76.1928, 314.2407) projected
  line L1 (76.1928, 415.8407) -> (76.1928, 314.2407) projected
  line L2 (76.1928, 415.8407) -> (-25.4072, 415.8407) projected
  line L3 (-25.4072, 415.8407) -> (-25.4072, 314.2407) projected
  circle A0 centre (-15.0948, 405.5283) radius 1.9812 projected
  circle A1 centre (-15.0948, 324.5531) radius 1.9812 projected
  circle A2 centre (65.8804, 324.5531) radius 1.9812 projected
  circle A3 centre (65.8804, 405.5283) radius 1.9812 projected
  point P0 (0, 0)
extrude "Extrusion43" cut sketch "Sketch43" against normal blind 6.35
sketch "Sketch44" plane through (-25.4072, 415.8407, -11.9634) normal (0, 1, 0) x (1, 0, 0)
  line L0 (0, -6.35) -> (101.6, -6.35) projected
  line L1 (101.6, 0) -> (101.6, -6.35) projected
  line L2 (0, 0) -> (101.6, 0) projected
  line L3 (0, -6.35) -> (0, 0) projected
  point P0 (25.4072, -11.9634)
extrude "Extrusion44" add sketch "Sketch44" along normal blind 19.05
sketch "Sketch45" plane through (-25.4072, 314.2407, -11.9634) normal (0, -1, 0) x (1, 0, 0)
  line L0 (101.6, 6.35) -> (0, 6.35) projected
  line L1 (0, 6.35) -> (0, 0) projected
  line L2 (101.6, 0) -> (0, 0) projected
  line L3 (101.6, 6.35) -> (101.6, 0) projected
  point P0 (25.4072, 11.9634)
extrude "Extrusion45" add sketch "Sketch45" along normal blind 19.05
sketch "Sketch46" plane through (0, 0, -11.9634) normal (0, 0, -1) x (-1, 0, 0)
  line L0 (-76.1928, 295.1907) -> (25.4072, 295.1907) projected
  circle A0 centre (-65.8804, 324.5531) radius 1.9812 projected
  circle A1 centre (15.0948, 324.5531) radius 1.9812 projected
  circle A2 centre (15.0948, 405.5283) radius 1.9812 projected
  line L1 (-65.8804, 324.5531) -> (15.0948, 324.5531)
  line L2 (15.0948, 324.5531) -> (15.0948, 405.5283)
  circle A3 centre (-25.3928, 365.0407) radius 11.5
  line L3 (-25.3928, 365.0407) -> (-35.8928, 365.0407)
  line L4 (-35.8928, 365.0407) -> (-14.8928, 365.0407)
  line L5 (-14.8928, 365.0407) -> (-14.8928, 400.0407)
  line L6 (-14.8928, 400.0407) -> (-35.8928, 400.0407)
  line L7 (-35.8928, 400.0407) -> (-35.8928, 365.0407)
  point P0 (0, 0)
  dimension "d118" = 23
  dimension "d119" = 10.5
  dimension "d120" = 21
  dimension "d121" = 35
extrude "Extrusion46" cut sketch "Sketch46" against normal blind 19.05 contours A3 L7 L3 L4 L5 | L5 L4 L3 L7 A3 | A3 L7 L6 L5
sketch "Sketch47" plane through (0, 0, -11.9634) normal (0, 0, -1) x (-1, 0, 0)
  arc A0 (-35.8928, 369.7311) -> (-14.8928, 369.7311) centre (-25.3928, 365.0407) ccw projected
  line L0 (-76.1928, 295.1907) -> (25.4072, 295.1907) projected
  line L1 (-25.3928, 365.0407) -> (-38.8928, 365.0407)
  line L2 (-38.8928, 365.0407) -> (-38.8928, 371.5407)
  line L3 (-38.8928, 371.5407) -> (-38.8928, 379.5407)
  line L4 (-38.8928, 379.5407) -> (-38.8928, 387.5407)
  line L5 (-38.8928, 371.5407) -> (-11.8928, 371.5407)
  line L6 (-38.8928, 387.5407) -> (-11.8928, 387.5407)
  circle A1 centre (-38.8928, 371.5407) radius 1
  circle A2 centre (-38.8928, 387.5407) radius 1
  circle A3 centre (-11.8928, 371.5407) radius 1
  circle A4 centre (-11.8928, 387.5407) radius 1
  point P0 (0, 0)
  dimension "d124" = 13.5
  dimension "d125" = 6.5
  dimension "d126" = 8
  dimension "d127" = 8
  dimension "d128" = 27
  dimension "d129" = 27
  dimension "d130" = 2
extrude "Extrusion47" cut sketch "Sketch47" against normal blind 25.4
sketch "Sketch48" plane through (0, 0, -5.6134) normal (0, 0, 1) x (1, 0, 0)
  circle A0 centre (38.8928, 371.5407) radius 1 projected
  circle A1 centre (38.8928, 387.5407) radius 1 projected
  circle A2 centre (11.8928, 387.5407) radius 1 projected
  circle A3 centre (11.8928, 371.5407) radius 1 projected
  line L0 (35.8928, 400.0407) -> (35.8928, 369.7311) projected
  arc A4 (14.8928, 369.7311) -> (35.8928, 369.7311) centre (25.3928, 365.0407) ccw projected
  line L1 (14.8928, 369.7311) -> (14.8928, 400.0407) projected
  line L2 (14.8928, 400.0407) -> (35.8928, 400.0407) projected
  point P0 (0, 0)
extrude "Extrusion48" add sketch "Sketch48" against normal blind 6.35
sketch "Sketch49" plane through (0, 0, -5.6134) normal (0, 0, 1) x (1, 0, 0)
  circle A0 centre (65.8804, 324.5531) radius 1.9812 projected
  line L0 (76.1928, 434.8907) -> (76.1928, 295.1907) projected
  line L1 (-25.4072, 295.1907) -> (-25.4072, 434.8907) projected
  line L2 (-25.4072, 324.5531) -> (76.1928, 324.5531)
  line L3 (65.8804, 324.5531) -> (76.1928, 324.5531)
  line L4 (76.1928, 324.5531) -> (76.1928, 314.2407)
  line L5 (76.1928, 314.2407) -> (65.8804, 314.2407)
  line L6 (65.8804, 314.2407) -> (65.8804, 324.5531)
  line L7 (76.1928, 314.2407) -> (-25.4072, 314.2407)
  line L8 (-25.4072, 314.2407) -> (-25.4072, 415.8407)
  line L9 (-25.4072, 415.8407) -> (76.1928, 415.8407)
  line L10 (76.1928, 415.8407) -> (76.1928, 314.2407)
  line L11 (-25.4072, 415.8407) -> (76.1928, 415.8407)
  line L12 (76.1928, 415.8407) -> (76.1928, 434.8907)
  line L13 (76.1928, 434.8907) -> (-25.4072, 434.8907)
  line L14 (-25.4072, 434.8907) -> (-25.4072, 415.8407)
  line L15 (76.1928, 314.2407) -> (-25.4072, 314.2407)
  line L16 (-25.4072, 314.2407) -> (-25.4072, 295.1907)
  line L17 (-25.4072, 295.1907) -> (76.1928, 295.1907)
  line L18 (76.1928, 295.1907) -> (76.1928, 314.2407)
  point P0 (0, 0)
  dimension "d135" = 10.3124
  dimension "d136" = 101.6
  dimension "d137" = 101.6
extrude "Extrusion49" cut sketch "Sketch49" against normal blind 6.35 contours L5 L0 L17 L1 L7 | L9 L1 L13 L0
sketch "Sketch50" plane through (0, 0, -11.9634) normal (0, 0, -1) x (-1, 0, 0)
  line L0 (-76.1928, 314.2407) -> (25.4072, 314.2407) projected
  line L1 (25.4072, 314.2407) -> (20.0732, 314.2407)
  line L2 (20.0732, 314.2407) -> (13.7232, 314.2407)
  line L3 (13.7232, 314.2407) -> (13.7232, 329.4807)
  line L4 (13.7232, 329.4807) -> (20.0732, 329.4807)
  line L5 (20.0732, 329.4807) -> (20.0732, 314.2407)
  line L6 (13.7232, 329.4807) -> (20.0732, 329.4807)
  line L7 (20.0732, 329.4807) -> (20.0732, 400.6007)
  line L8 (20.0732, 400.6007) -> (13.7232, 400.6007)
  line L9 (13.7232, 400.6007) -> (13.7232, 329.4807)
  point P0 (0, 0)
  dimension "d140" = 5.334
  dimension "d141" = 6.35
  dimension "d142" = 15.24
  dimension "d143" = 71.12
extrude "Extrusion50" cut sketch "Sketch50" against normal blind 6.35 contours L9 L8 L7 L4
sketch "Sketch51" plane through (0, 0, -11.9634) normal (0, 0, -1) x (-1, 0, 0)
  line L0 (13.7232, 329.4807) -> (20.0732, 329.4807)
  line L1 (20.0732, 329.4807) -> (20.0732, 328.7187)
  line L2 (20.0732, 328.7187) -> (13.7232, 328.7187)
  line L3 (13.7232, 328.7187) -> (13.7232, 329.4807)
  line L4 (13.7232, 400.6007) -> (20.0732, 400.6007)
  line L5 (20.0732, 400.6007) -> (20.0732, 401.3627)
  line L6 (20.0732, 401.3627) -> (13.7232, 401.3627)
  line L7 (13.7232, 401.3627) -> (13.7232, 400.6007)
  point P0 (0, 0)
  dimension "d146" = 0.762
  dimension "d147" = 0.762
extrude "Extrusion51" cut sketch "Sketch51" against normal blind 6.35
sketch "Sketch52" plane through (0, 0, -5.6134) normal (0, 0, 1) x (1, 0, 0)
  circle A0 centre (65.8804, 324.5531) radius 1.9812 projected
  circle A1 centre (65.8804, 405.5283) radius 1.9812 projected
  circle A2 centre (-15.0948, 405.5283) radius 1.9812 projected
  circle A3 centre (-15.0948, 324.5531) radius 1.9812 projected
  line L0 (-15.0948, 405.5283) -> (65.8804, 324.5531)
  line L1 (-15.0948, 324.5531) -> (65.8804, 405.5283)
  circle A4 centre (25.3928, 365.0407) radius 8
  circle A5 centre (33.3928, 365.0407) radius 1
  circle A6 centre (25.3928, 357.0407) radius 1
  circle A7 centre (25.3928, 373.0407) radius 1
  circle A8 centre (17.3928, 365.0407) radius 1
  point P0 (0, 0)
  dimension "d150" = 16
  dimension "d151" = 2
  dimension "d152" = 2
  dimension "d153" = 2
  dimension "d154" = 2
extrude "Extrusion52" cut sketch "Sketch52" against normal blind 6.35 contours A7 A4 | A4 A7 | A8 A4 | A4 A8 | A6 A4 | A4 A6 | A5 A4 | A4 A5
properties part number "kinect rotate2 side"
